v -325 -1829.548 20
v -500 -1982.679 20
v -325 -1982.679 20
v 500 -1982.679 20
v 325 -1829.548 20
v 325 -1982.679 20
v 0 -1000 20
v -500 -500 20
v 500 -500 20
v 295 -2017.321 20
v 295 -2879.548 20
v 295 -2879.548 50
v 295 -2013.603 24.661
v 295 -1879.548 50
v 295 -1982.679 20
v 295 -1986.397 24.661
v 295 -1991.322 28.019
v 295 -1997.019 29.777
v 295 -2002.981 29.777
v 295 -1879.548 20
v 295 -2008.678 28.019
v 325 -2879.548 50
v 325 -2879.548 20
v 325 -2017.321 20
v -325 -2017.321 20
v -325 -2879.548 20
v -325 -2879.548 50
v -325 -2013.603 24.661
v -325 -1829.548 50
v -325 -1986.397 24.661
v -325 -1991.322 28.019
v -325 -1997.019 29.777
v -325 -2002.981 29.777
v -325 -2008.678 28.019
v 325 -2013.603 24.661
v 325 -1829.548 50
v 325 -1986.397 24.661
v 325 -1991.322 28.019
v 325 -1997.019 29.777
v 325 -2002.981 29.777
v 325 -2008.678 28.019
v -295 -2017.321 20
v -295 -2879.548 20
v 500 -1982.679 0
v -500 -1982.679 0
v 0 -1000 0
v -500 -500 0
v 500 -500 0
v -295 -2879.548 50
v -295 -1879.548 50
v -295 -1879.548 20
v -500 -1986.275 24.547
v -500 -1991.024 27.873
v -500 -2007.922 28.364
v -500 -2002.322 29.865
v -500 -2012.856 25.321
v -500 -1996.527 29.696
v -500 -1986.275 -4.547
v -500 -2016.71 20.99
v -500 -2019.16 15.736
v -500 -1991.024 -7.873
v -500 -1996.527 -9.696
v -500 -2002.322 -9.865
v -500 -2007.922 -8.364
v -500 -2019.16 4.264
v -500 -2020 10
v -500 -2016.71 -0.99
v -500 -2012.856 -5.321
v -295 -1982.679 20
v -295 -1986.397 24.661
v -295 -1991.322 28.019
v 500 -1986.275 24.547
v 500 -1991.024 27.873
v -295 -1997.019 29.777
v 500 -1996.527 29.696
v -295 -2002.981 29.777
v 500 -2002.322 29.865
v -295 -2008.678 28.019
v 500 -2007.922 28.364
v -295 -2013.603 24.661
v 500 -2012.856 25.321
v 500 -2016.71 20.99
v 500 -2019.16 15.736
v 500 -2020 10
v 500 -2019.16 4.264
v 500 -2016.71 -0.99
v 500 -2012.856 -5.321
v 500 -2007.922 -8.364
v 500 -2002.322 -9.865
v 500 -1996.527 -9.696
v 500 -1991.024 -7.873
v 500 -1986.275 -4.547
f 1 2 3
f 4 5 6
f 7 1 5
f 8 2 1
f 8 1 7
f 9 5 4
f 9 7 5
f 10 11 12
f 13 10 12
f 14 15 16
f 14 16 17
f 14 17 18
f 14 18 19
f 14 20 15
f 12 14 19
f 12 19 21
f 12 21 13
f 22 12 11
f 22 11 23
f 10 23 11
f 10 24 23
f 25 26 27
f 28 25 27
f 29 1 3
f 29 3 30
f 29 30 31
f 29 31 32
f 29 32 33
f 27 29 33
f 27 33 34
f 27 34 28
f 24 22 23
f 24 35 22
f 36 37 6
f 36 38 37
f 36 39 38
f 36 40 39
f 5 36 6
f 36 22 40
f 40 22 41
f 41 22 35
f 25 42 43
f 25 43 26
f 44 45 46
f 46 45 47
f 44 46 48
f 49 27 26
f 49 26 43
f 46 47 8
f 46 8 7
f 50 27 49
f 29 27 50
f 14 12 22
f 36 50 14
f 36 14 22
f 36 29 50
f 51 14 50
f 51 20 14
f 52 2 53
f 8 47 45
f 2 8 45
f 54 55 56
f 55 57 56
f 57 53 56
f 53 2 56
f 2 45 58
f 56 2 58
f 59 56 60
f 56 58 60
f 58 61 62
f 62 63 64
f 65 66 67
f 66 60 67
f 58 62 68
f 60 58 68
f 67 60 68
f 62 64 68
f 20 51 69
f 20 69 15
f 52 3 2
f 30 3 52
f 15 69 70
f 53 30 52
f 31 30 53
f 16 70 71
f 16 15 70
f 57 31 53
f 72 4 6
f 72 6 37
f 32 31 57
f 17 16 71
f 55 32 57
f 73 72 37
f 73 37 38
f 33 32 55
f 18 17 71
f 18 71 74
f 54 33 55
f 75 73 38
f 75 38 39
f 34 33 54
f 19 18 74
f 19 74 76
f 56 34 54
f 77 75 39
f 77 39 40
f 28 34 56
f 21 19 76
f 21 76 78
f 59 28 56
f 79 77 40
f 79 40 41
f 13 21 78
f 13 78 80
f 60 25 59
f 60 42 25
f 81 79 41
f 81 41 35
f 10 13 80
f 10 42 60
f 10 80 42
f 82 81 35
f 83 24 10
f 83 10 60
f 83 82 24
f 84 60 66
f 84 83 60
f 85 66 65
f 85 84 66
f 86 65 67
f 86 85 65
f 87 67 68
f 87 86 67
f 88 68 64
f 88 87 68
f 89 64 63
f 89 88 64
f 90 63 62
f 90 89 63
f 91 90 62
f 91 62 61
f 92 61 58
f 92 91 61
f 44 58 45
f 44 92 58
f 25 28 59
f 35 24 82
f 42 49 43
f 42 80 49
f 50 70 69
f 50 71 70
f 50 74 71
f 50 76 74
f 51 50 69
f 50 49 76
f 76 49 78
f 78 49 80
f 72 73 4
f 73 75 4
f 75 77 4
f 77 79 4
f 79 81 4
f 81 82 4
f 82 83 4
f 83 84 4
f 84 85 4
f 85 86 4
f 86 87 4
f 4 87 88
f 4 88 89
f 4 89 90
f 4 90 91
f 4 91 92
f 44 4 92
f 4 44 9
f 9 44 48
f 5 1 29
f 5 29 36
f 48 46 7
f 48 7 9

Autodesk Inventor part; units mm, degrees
ref_plane "YZ Plane" through (0, 0, 0) normal (1, 0, 0) x (0, 1, 0)
ref_plane "XZ Plane" through (0, 0, 0) normal (0, 1, 0) x (-1, 0, 0)
ref_plane "XY Plane" through (0, 0, 0) normal (0, 0, 1) x (1, 0, 0)
sketch "草圖1" plane through (0, 0, 0) normal (0, 0, 1) x (1, 0, 0)
  line L0 (-500, -500) -> (0, -1000)
  line L1 (0, -1000) -> (500, -500)
  line L2 (-500, -500) -> (-500, -2000)
  line L3 (-500, -2000) -> (500, -2000)
  line L4 (500, -2000) -> (500, -500)
  point P0 (0, 0)
  dimension "d2" = 1500
  dimension "d3" = 1000
extrude "擠出1" add sketch "草圖1" along normal blind 20
sketch "草圖2" plane through (500, -2000, 0) normal (1, 0, 0) x (0, 0, -1)
  line L0 (0, 0) -> (-20, 0) projected
  circle A0 centre (-10, 0) radius 20
  point P0 (0, 2000)
  dimension "d6" = 40
extrude "擠出2" add sketch "草圖2" against normal blind 1000
sketch "草圖3" plane through (0, 0, 20) normal (0, 0, 1) x (1, 0, 0)
  line L0 (325, -1879.5485) -> (-325, -1879.5485)
  line L1 (-325, -1879.5485) -> (-325, -1829.5485)
  line L2 (-325, -1829.5485) -> (325, -1829.5485)
  line L3 (325, -1829.5485) -> (325, -1879.5485)
  line L4 (325, -1879.5485) -> (-325, -1829.5485) construction
  line L5 (-325, -1879.5485) -> (325, -1829.5485) construction
  point P0 (0, 0)
  point P1 (0, -1854.5485)
  dimension "d9" = 650
  dimension "d10" = 50
extrude "擠出3" add sketch "草圖3" along normal blind 30
sketch "草圖4" plane through (-325, -1879.5485, 20) normal (0, -1, 0) x (1, 0, 0)
  line L0 (650, 0) -> (0, 0) projected
  line L1 (0, 30) -> (650, 30) projected
  line L2 (650, 0) -> (620, 0)
  line L3 (620, 0) -> (620, 30)
  line L4 (620, 30) -> (650, 30)
  line L5 (650, 30) -> (650, 0)
  line L6 (0, 0) -> (650, 0) projected
  line L7 (0, 30) -> (30, 30)
  line L8 (30, 30) -> (30, 0)
  line L9 (30, 0) -> (0, 0)
  line L10 (0, 0) -> (0, 30)
  point P0 (325, -20)
  dimension "d13" = 30
  dimension "d14" = 30
extrude "擠出4" add sketch "草圖4" along normal blind 1000 contours L0 L3 L1 L5
extrude "擠出5" add sketch "草圖4" along normal blind 1000 contours L0 L10 L1 L8
properties part number "flag"
